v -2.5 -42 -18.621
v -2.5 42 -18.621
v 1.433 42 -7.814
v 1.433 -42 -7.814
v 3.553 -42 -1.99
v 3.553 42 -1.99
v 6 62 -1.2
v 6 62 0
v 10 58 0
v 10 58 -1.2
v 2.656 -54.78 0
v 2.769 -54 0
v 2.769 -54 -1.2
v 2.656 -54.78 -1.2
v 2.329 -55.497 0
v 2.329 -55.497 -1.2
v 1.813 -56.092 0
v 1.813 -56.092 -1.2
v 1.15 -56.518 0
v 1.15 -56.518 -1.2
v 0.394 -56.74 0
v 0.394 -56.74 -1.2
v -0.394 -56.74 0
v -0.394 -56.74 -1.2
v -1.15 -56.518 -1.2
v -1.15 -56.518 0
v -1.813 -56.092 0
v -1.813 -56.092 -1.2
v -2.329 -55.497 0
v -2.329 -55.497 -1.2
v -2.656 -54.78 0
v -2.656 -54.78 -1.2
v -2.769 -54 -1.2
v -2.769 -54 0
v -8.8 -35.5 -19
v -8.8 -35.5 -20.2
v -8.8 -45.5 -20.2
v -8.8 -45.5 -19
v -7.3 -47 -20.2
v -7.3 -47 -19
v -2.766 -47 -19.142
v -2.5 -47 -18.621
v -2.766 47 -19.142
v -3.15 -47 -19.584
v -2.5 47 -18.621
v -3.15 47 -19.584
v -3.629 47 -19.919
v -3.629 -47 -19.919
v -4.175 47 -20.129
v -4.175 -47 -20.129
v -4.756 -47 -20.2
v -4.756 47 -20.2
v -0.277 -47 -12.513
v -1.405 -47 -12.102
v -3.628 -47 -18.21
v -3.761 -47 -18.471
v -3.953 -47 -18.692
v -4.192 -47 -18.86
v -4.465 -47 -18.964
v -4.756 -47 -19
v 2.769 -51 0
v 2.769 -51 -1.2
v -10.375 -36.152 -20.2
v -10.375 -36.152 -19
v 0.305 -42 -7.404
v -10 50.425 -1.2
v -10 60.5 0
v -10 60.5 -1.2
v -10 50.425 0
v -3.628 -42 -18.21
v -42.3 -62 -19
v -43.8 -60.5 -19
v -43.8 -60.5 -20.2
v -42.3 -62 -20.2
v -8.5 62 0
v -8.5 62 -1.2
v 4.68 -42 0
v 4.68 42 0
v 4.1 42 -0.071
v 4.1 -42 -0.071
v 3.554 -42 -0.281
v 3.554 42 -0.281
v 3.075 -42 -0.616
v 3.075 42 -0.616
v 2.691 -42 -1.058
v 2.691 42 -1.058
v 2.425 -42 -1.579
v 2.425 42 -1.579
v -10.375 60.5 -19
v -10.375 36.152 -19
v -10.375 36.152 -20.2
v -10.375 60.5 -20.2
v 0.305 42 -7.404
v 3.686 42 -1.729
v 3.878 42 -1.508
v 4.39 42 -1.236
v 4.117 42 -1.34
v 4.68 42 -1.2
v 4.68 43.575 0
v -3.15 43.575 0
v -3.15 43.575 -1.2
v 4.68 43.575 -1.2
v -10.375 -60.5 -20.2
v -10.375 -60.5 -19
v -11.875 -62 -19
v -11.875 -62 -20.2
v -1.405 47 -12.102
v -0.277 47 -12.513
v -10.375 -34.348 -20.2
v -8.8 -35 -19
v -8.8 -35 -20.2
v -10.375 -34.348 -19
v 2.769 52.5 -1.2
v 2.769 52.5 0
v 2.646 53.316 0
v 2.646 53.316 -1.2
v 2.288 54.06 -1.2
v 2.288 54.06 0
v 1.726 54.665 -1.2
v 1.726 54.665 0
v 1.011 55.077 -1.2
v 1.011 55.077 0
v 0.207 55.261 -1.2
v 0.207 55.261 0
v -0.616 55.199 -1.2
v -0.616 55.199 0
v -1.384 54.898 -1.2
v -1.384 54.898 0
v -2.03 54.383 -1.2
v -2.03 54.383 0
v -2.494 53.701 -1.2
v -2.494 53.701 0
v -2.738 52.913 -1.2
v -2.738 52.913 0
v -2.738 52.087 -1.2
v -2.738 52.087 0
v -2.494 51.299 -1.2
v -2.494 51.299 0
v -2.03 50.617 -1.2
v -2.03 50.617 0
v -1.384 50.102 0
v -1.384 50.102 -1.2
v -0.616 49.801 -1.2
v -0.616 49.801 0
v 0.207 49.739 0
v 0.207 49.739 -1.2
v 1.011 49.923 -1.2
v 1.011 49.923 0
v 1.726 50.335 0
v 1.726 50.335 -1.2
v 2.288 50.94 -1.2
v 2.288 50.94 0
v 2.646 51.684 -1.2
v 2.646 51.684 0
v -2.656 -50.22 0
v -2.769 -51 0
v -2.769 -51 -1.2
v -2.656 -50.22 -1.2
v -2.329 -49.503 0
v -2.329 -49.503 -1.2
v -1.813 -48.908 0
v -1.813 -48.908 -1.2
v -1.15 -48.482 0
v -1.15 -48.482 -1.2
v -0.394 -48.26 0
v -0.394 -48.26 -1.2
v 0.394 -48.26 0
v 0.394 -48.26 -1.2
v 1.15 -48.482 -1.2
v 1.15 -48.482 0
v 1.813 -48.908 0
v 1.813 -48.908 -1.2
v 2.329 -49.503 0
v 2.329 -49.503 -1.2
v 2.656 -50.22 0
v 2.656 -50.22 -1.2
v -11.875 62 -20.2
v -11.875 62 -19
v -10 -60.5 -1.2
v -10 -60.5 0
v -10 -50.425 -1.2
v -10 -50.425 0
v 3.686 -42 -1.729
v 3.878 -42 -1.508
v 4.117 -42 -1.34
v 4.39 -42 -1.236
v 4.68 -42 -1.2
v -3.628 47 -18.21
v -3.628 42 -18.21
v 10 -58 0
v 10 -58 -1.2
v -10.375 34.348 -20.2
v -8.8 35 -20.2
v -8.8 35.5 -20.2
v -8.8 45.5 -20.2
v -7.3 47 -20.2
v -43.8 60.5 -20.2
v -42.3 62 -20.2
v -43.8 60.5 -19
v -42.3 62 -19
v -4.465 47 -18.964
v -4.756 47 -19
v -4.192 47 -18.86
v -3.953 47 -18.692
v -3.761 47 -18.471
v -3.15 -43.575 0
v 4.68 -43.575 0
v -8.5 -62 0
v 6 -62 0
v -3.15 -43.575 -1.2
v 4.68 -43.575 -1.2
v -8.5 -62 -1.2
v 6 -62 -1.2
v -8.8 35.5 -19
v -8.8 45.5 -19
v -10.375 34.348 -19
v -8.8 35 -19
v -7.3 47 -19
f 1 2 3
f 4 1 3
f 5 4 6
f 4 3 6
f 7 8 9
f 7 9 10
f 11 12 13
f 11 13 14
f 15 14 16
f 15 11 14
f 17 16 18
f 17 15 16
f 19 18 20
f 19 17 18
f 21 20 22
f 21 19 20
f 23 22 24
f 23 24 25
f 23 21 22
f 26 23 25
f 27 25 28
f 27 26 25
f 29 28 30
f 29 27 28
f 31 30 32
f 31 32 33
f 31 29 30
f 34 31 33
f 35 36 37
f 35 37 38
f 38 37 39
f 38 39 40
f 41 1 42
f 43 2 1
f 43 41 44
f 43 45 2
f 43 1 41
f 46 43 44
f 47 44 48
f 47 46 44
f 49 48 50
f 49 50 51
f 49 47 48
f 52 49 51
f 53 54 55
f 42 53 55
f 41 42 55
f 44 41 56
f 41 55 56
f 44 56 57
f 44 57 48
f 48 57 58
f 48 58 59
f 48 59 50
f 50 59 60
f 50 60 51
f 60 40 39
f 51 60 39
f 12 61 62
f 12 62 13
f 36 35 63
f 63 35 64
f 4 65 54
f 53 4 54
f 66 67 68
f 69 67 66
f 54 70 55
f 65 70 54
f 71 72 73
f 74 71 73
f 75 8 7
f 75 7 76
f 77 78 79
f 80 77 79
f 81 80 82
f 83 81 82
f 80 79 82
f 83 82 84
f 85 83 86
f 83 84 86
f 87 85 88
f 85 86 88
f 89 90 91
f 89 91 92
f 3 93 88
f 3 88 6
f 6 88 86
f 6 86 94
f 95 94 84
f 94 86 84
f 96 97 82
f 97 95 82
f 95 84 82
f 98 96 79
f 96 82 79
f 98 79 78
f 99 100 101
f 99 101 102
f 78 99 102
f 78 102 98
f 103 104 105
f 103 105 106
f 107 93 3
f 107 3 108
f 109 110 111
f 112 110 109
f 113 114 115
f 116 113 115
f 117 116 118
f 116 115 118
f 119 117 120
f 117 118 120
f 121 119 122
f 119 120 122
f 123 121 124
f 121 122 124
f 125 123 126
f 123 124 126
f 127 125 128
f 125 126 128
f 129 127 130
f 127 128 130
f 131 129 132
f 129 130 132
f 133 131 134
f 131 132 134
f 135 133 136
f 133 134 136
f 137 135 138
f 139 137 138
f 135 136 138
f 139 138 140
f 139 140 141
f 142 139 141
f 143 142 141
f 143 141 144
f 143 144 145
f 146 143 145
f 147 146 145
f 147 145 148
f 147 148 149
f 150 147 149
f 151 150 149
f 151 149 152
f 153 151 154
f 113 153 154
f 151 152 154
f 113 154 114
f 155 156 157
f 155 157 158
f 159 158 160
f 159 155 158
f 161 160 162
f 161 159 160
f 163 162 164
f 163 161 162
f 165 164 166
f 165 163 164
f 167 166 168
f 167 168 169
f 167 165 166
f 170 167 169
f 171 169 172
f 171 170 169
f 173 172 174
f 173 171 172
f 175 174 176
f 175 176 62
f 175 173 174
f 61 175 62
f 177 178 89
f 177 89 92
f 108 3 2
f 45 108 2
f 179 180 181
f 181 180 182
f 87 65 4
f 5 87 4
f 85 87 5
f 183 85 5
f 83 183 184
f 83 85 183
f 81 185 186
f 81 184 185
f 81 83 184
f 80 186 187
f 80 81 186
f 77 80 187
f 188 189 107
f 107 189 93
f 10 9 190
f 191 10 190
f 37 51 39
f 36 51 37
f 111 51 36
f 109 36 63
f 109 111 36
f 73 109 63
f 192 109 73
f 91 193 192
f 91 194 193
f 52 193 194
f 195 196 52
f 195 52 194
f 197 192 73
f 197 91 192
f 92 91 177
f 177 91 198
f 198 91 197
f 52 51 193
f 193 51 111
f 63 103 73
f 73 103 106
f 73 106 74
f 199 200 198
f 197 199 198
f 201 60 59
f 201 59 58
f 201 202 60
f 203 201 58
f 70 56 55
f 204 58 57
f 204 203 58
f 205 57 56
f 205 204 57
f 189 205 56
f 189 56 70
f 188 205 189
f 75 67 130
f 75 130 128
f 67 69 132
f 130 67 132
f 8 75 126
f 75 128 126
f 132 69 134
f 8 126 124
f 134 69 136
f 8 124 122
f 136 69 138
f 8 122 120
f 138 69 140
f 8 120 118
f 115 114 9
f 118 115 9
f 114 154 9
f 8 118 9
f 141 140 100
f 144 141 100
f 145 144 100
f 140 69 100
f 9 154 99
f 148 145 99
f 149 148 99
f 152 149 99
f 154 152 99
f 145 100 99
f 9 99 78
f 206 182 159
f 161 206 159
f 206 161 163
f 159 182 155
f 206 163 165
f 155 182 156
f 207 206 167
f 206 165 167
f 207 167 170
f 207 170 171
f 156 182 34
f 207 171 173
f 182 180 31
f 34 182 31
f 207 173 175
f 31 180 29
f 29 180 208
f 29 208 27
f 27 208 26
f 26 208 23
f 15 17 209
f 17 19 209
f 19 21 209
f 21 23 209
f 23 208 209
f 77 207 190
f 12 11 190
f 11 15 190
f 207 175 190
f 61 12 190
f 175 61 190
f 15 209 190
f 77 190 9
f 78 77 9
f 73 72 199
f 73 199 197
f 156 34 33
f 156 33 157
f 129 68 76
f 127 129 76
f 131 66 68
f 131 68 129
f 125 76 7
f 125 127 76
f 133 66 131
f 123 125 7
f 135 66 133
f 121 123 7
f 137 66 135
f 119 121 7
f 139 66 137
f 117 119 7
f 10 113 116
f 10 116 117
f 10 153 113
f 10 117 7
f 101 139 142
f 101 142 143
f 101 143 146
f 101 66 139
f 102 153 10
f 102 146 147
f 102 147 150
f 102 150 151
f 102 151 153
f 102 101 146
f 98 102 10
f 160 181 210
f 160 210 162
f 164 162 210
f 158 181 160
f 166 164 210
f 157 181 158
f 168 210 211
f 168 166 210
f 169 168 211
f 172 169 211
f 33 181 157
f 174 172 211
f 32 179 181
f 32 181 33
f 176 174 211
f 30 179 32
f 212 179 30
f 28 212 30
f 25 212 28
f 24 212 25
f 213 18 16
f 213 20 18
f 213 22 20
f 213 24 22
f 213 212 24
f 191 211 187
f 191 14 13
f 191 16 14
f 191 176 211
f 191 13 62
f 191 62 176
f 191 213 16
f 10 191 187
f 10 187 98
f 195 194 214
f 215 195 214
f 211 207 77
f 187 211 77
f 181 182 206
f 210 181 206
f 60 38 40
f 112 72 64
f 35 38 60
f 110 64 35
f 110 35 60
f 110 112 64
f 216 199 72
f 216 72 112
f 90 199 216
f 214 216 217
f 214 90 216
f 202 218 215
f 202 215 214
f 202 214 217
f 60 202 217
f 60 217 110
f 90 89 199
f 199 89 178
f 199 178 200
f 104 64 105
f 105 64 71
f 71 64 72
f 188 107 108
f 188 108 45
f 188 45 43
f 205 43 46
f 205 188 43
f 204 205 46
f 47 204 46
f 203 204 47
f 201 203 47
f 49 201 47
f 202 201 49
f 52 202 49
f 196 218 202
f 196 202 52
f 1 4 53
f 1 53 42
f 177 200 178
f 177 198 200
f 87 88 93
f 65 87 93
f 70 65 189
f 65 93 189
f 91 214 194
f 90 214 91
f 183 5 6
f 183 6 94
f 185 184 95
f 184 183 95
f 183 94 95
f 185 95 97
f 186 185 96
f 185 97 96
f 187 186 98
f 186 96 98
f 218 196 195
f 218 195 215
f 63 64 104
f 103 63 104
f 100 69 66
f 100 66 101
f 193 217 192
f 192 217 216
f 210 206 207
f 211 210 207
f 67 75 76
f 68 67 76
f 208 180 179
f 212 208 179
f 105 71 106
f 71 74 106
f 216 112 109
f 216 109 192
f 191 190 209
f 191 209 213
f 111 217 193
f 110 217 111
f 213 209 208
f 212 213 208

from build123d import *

# Parameters (mm, degrees)
BOSS_EXTRUDE1_DEPTH            = 62
CONVERT_SOLID1_DEPTH           = 62
CONVERT_SOLID1_2_DEPTH         = 62
CUT_EXTRUDE2_DEPTH             = 79.552402891
SKETCH9_W                      = 18.8
SKETCH9_H                      = 20
CUT_EXTRUDE3_DEPTH             = 79.552402891
BOSS_EXTRUDE3_DEPTH            = 1.2
BOSS_EXTRUDE4_DEPTH            = 20
CUT_EXTRUDE4_DEPTH             = 20.58
CUT_EXTRUDE4_DIRECTION_2_REACH = 81.822
CHAMFER4_SIZE                  = 4
CHAMFER1_SIZE                  = 1.5
SKETCH7_R                      = 2.7686
CUT_EXTRUDE1_DEPTH             = 1.2


# Read off the part's stored shape, not the designer's step: Convert-Solid1
with BuildPart() as part:
    # Sketch2 → Boss-Extrude1 (new body)
    with BuildSketch(Plane(origin=(0, 0, 0), x_dir=(1, 0, 0), z_dir=(0, 1, 0))):
        Polygon((10, 0), (3, 0), (-3.915434451, 19), (-43.8, 19), (-43.8, 40), (10, 40), align=None)
    extrude(amount=BOSS_EXTRUDE1_DEPTH)

    # Convert-Solid1 outline → Convert-Solid1 (cut)
    with BuildSketch(Plane(origin=(0, 0, 0), x_dir=(1, 0, 0), z_dir=(0, 1, 0))):
        with BuildLine():
            ThreePointArc((4.680498092, 0), (3.303914645, 0.434035094), (2.425235802, 1.579151656))
            Line((2.425235802, 1.579151656), (3, 0))
            Line((3, 0), (4.680498092, 0))
        make_face()
        with BuildLine():
            Line((-43.8, 40), (-43.8, 20.2))
            Line((-43.8, 20.2), (-4.755683497, 20.2))
            ThreePointArc((-4.755683497, 20.2), (-3.37910005, 19.765964906), (-2.500421207, 18.620848344))
            Line((-2.500421207, 18.620848344), (3.552866947, 1.989575828))
            ThreePointArc((3.552866947, 1.989575828), (3.992206368, 1.417017547), (4.680498092, 1.2))
            Line((4.680498092, 1.2), (10, 1.2))
            Line((10, 1.2), (10, 40))
            Line((10, 40), (-43.8, 40))
        make_face()
    extrude(amount=CONVERT_SOLID1_DEPTH, mode=Mode.SUBTRACT)

    # Convert-Solid1 2 outline → Convert-Solid1 2 (add)
    with BuildSketch(Plane(origin=(0, 0, 0), x_dir=(1, 0, 0), z_dir=(0, 1, 0))):
        with BuildLine():
            ThreePointArc((-4.755683497, 19), (-4.067391773, 18.782982453), (-3.628052352, 18.210424172))
            Line((-3.628052352, 18.210424172), (-3.915434451, 19))
            Line((-3.915434451, 19), (-4.755683497, 19))
        make_face()
    extrude(amount=CONVERT_SOLID1_2_DEPTH)

    # Sketch8 → Cut-Extrude2 (cut, through all)
    with BuildSketch(Plane.XY):
        Polygon((-8.8, 35), (-10.3748, 34.347696482), (-10.3748, -34.347696482), (-8.8, -35), align=None)
        Polygon((-8.8, 35.5), (-10.3748, 36.152303518), (-10.3748, 75), (-8.8, 75), align=None)
        Polygon((-10.3748, -36.152303518), (-10.3748, -75), (-8.8, -75), (-8.8, -35.5), align=None)
    extrude(amount=-CUT_EXTRUDE2_DEPTH, mode=Mode.SUBTRACT)

    # Sketch9 → Cut-Extrude3 (cut, through all)
    with BuildSketch(Plane.XY):
        with Locations((0.6, 52)):
            Rectangle(SKETCH9_W, SKETCH9_H)
    extrude(amount=-CUT_EXTRUDE3_DEPTH, mode=Mode.SUBTRACT)

    # Sketch11 → Boss-Extrude3 (add)
    with BuildSketch(Plane.XY):
        Polygon((-3.1496, 43.5748), (4.680498092, 43.5748), (4.680498092, 42), (10, 42), (10, 62), (-10, 62), (-10, 50.4252), align=None)
    extrude(amount=-BOSS_EXTRUDE3_DEPTH)

    # Sketch12 → Boss-Extrude4 (add)
    with BuildSketch(Plane(origin=(0, 42, 0), x_dir=(1, 0, 0), z_dir=(0, 1, 0))):
        with BuildLine():
            Line((-3.628052352, 18.210424172), (0.305179296, 7.403959033))
            Line((0.305179296, 7.403959033), (1.432810441, 7.814383205))
            Line((1.432810441, 7.814383205), (-2.500421207, 18.620848344))
            ThreePointArc((-2.500421207, 18.620848344), (-3.37910005, 19.765964906), (-4.755683497, 20.2))
            Line((-4.755683497, 20.2), (-8.8, 20.2))
            Line((-8.8, 20.2), (-8.8, 19))
            Line((-8.8, 19), (-4.755683497, 19))
            ThreePointArc((-4.755683497, 19), (-4.067391773, 18.782982453), (-3.628052352, 18.210424172))
        make_face()
    extrude(amount=BOSS_EXTRUDE4_DEPTH)

    # Sketch13 → Cut-Extrude4 (cut)
    with BuildSketch(Plane(origin=(2.649066665, 0, -0.964181415), x_dir=(0.34202014332566943, 0, 0.9396926207859082), z_dir=(-0.9396926207859082, 0, 0.34202014332566943))):
        Polygon((-6.853068201, 42), (-11.853068201, 47), (-26.853068201, 47), (-26.853068201, 62), (-6.853068201, 62), align=None)
    extrude(amount=-CUT_EXTRUDE4_DEPTH, mode=Mode.SUBTRACT)

    # Cut-Extrude4 direction 2: up to this plane
    cut_extrude4_direction_2_end = Plane(origin=(-8.8, 35.5, -20.2), z_dir=(1, 0, 0))
    # Sketch13 → Cut-Extrude4 direction 2 (cut, up to the surface)
    with BuildSketch(Plane(origin=(2.649066665, 0, -0.964181415), x_dir=(0.34202014332566943, 0, 0.9396926207859082), z_dir=(-0.9396926207859082, 0, 0.34202014332566943)), mode=Mode.PRIVATE) as cut_extrude4_direction_2_sk1:
        Polygon((-6.853068201, 42), (-11.853068201, 47), (-26.853068201, 47), (-26.853068201, 62), (-6.853068201, 62), align=None)
    cut_extrude4_direction_2_tool1 = split(extrude(cut_extrude4_direction_2_sk1.sketch, amount=CUT_EXTRUDE4_DIRECTION_2_REACH, mode=Mode.PRIVATE), bisect_by=cut_extrude4_direction_2_end, keep=Keep.BOTH, mode=Mode.PRIVATE)
    add(cut_extrude4_direction_2_tool1.solids().sort_by_distance((-3.001015, 54.133333, -16.487654))[0], mode=Mode.SUBTRACT)

    # Chamfer4
    chamfer4_edges = [part.edges().sort_by_distance(p)[0] for p in [
        (10, 62, -0.6),
    ]]
    chamfer(chamfer4_edges, length=CHAMFER4_SIZE)

    # Chamfer1
    chamfer1_edges = [part.edges().sort_by_distance(p)[0] for p in [
        (-10, 62, -0.6),
        (-8.8, 47, -19.6),
        (-43.8, 62, -19.6),
        (-10.3748, 62, -19.6),
    ]]
    chamfer(chamfer1_edges, length=CHAMFER1_SIZE)

    # Mirror1: part across plane


with BuildPart() as part_1:
    add(part.part)
    add(part.part.mirror(Plane(origin=(10, 0, 0), x_dir=(0, 0, 1), z_dir=(0, 1, 0))))

    # Sketch7 → Cut-Extrude1 (cut)
    with BuildSketch(Plane.XY):
        with Locations((0, 52.5)):
            Circle(SKETCH7_R)
        with BuildLine():
            Line((-2.7686, -54), (-2.7686, -51))
            ThreePointArc((-2.7686, -51), (0, -48.2314), (2.7686, -51))
            Line((2.7686, -51), (2.7686, -54))
            ThreePointArc((2.7686, -54), (0, -56.7686), (-2.7686, -54))
        make_face()
    extrude(amount=-CUT_EXTRUDE1_DEPTH, mode=Mode.SUBTRACT)


solid = part_1.part
